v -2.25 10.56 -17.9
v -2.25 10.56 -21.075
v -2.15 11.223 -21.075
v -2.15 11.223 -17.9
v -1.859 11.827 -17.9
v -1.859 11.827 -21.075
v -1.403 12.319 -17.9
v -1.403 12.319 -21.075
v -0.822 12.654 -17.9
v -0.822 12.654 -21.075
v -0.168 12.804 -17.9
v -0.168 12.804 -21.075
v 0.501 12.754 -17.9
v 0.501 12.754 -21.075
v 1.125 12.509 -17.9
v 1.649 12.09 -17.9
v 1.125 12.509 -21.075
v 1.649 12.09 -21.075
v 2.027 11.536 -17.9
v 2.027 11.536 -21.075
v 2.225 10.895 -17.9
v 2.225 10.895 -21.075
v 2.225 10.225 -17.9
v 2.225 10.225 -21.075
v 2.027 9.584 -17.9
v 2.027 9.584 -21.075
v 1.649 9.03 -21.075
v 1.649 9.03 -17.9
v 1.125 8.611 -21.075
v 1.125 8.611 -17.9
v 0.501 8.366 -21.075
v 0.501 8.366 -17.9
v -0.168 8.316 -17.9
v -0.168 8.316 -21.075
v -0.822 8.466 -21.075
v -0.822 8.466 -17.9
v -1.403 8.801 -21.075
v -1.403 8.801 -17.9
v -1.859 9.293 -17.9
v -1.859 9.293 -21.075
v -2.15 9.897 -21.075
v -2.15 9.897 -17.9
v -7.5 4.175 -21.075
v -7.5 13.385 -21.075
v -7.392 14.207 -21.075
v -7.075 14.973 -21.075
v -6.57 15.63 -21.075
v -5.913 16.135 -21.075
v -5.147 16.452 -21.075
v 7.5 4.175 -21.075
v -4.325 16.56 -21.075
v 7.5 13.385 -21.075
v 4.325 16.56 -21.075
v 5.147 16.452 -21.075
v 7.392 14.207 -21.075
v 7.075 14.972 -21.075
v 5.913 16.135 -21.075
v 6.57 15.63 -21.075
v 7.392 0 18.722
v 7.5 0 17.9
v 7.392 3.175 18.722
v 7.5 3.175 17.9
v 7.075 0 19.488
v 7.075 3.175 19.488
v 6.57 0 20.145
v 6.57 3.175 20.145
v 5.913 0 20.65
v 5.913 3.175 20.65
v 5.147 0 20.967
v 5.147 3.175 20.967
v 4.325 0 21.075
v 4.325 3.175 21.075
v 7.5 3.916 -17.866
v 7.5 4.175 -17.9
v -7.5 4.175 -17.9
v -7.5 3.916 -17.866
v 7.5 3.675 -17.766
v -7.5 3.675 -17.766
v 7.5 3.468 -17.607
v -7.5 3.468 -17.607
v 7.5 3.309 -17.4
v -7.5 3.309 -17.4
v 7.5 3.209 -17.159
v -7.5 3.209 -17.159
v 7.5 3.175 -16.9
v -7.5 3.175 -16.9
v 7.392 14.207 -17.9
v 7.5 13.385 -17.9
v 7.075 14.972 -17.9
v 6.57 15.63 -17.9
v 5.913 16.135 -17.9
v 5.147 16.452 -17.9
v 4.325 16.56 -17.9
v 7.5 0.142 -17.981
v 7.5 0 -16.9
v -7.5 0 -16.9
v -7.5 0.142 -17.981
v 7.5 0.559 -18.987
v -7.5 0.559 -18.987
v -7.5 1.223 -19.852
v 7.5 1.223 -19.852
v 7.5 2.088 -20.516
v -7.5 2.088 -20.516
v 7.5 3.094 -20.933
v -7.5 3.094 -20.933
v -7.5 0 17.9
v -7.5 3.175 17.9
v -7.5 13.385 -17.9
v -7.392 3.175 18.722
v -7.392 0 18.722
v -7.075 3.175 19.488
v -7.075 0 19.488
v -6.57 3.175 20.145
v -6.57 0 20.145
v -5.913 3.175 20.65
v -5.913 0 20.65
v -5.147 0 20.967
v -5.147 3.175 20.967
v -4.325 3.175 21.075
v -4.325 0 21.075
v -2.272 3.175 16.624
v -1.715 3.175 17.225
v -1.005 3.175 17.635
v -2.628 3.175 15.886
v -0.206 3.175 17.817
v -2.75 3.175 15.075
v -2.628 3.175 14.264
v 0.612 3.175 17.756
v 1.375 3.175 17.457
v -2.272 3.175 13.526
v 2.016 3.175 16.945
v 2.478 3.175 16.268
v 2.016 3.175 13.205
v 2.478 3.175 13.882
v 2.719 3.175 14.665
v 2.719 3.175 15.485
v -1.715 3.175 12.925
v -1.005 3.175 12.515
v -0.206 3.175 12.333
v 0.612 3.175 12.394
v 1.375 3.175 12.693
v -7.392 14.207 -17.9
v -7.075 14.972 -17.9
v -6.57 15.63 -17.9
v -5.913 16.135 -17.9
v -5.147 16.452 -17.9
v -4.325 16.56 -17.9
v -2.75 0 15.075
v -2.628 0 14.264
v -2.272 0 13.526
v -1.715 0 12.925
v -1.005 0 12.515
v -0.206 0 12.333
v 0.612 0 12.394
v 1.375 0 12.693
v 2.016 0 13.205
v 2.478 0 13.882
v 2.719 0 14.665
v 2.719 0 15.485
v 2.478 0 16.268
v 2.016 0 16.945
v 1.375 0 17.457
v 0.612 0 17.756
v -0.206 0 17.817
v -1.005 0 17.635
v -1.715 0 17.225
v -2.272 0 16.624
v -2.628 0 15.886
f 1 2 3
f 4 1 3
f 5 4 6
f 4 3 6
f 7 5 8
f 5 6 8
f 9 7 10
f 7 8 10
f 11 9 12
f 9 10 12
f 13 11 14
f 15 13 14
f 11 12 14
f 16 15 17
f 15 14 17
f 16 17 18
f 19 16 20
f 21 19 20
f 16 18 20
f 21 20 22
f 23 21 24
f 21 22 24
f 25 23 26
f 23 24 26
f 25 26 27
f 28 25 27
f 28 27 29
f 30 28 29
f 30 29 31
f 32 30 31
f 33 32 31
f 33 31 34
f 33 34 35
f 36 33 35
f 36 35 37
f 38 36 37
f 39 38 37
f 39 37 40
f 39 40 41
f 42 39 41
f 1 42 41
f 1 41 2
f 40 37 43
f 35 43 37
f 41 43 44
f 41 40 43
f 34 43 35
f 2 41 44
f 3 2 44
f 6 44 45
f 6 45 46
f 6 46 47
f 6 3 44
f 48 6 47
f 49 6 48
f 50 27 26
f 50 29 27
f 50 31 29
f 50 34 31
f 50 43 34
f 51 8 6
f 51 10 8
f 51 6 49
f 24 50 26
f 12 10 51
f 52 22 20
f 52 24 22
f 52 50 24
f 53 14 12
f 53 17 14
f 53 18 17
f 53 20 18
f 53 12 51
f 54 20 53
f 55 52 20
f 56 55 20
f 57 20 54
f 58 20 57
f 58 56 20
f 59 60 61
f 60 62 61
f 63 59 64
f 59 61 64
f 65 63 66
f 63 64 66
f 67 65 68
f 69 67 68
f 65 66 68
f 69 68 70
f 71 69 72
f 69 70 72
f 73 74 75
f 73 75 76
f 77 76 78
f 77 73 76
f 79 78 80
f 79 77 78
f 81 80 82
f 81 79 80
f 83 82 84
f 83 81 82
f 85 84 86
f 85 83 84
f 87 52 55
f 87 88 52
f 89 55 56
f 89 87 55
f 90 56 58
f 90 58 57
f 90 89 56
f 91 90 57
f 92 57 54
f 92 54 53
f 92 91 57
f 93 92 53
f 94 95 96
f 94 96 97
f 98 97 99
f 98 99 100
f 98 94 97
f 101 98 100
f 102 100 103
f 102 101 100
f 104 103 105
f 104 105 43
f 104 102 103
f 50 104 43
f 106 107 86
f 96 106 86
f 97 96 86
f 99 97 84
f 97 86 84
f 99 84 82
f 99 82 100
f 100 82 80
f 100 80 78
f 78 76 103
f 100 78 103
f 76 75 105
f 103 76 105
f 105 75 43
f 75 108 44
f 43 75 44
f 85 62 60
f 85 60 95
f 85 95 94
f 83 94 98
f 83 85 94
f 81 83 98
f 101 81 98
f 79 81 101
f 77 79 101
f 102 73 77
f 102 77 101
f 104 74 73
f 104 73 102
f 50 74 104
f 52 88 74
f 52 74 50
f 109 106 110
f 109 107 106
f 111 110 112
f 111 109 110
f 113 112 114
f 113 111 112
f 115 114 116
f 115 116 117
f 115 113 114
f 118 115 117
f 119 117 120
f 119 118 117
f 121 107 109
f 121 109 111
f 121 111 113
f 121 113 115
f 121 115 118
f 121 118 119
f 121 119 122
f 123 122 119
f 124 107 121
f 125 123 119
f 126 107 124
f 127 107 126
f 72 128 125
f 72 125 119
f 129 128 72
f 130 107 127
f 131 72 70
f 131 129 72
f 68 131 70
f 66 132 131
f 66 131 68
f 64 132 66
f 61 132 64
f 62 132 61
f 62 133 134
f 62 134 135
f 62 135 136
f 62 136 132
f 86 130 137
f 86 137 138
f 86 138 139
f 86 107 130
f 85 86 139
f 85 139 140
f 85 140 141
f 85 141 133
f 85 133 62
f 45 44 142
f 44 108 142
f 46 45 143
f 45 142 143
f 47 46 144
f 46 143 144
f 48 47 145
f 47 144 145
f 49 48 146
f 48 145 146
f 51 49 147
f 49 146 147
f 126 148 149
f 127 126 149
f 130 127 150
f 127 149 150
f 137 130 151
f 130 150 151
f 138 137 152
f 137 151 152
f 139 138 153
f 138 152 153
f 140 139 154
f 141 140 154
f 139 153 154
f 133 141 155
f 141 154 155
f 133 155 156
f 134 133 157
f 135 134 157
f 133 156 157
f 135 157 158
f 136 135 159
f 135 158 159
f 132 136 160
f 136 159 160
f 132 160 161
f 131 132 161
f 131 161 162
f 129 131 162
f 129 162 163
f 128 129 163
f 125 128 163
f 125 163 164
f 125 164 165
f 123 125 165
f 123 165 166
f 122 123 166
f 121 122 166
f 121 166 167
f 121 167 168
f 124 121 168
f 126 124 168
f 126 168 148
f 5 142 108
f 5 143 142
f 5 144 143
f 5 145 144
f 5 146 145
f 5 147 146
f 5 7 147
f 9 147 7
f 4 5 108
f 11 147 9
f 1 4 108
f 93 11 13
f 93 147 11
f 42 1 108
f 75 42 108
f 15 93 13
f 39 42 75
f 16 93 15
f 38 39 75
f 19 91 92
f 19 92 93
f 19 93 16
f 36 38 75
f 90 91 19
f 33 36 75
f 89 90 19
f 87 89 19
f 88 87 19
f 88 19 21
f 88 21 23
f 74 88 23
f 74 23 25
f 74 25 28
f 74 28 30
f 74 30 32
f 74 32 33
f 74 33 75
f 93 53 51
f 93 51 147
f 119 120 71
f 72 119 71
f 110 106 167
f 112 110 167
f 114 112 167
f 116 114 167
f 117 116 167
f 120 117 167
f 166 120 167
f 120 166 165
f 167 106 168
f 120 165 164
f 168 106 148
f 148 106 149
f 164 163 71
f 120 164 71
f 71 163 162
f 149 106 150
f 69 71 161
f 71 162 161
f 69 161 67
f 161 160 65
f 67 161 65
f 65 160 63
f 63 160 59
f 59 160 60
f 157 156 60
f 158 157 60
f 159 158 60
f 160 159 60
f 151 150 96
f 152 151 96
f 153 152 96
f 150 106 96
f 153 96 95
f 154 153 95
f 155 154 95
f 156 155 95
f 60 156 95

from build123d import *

# Parameters (mm, degrees)
SKETCH1_W                    = 15
SKETCH1_H                    = 42.15
BASE_FLANGE1_DEPTH           = 3.175
EDGE_FLANGE1_STRIP_W         = 14.7
EDGE_FLANGE1_STRIP_H         = 3.175
EDGE_FLANGE1_STRIP_CUT_DEPTH = 15
EDGE_FLANGE1_DEPTH           = 15
M5_CLEARANCE_HOLE1_D         = 5.5
M4_CLEARANCE_HOLE1_D         = 4.5
FILLET1_R                    = 3.175


# Sheet-metal steps are written as plain solids
with BuildPart() as part:
    # Sketch1 → Base-Flange1 (new body)
    with BuildSketch(Plane(origin=(0, 0, 0), x_dir=(1, 0, 0), z_dir=(0, 1, 0))):
        Rectangle(SKETCH1_W, SKETCH1_H)
    extrude(amount=BASE_FLANGE1_DEPTH)

    # Edge-Flange1 strip (across the edge) → Edge-Flange1 strip cut (cut)
    with BuildSketch(Plane(origin=(7.5, 3.175, -21.075), x_dir=(0, 0, 1), z_dir=(-1, 0, 0))):
        with Locations((-3.175, -1.5875)):
            Rectangle(EDGE_FLANGE1_STRIP_W, EDGE_FLANGE1_STRIP_H)
    extrude(amount=EDGE_FLANGE1_STRIP_CUT_DEPTH, mode=Mode.SUBTRACT)

    # Edge-Flange1 section (across the edge) → Edge-Flange1 (add)
    with BuildSketch(Plane(origin=(7.5, 3.175, -21.075), x_dir=(0, 0, 1), z_dir=(-1, 0, 0))):
        with BuildLine():
            Line((0, 1), (0, 13.385))
            Line((0, 13.385), (3.175, 13.385))
            Line((3.175, 13.385), (3.175, 1))
            ThreePointArc((3.175, 1), (3.467893219, 0.292893219), (4.175, 0))
            Line((4.175, 0), (4.175, -3.175))
            ThreePointArc((4.175, -3.175), (1.222829189, -1.952170811), (0, 1))
        make_face()
    extrude(amount=EDGE_FLANGE1_DEPTH)

    # M5 Clearance Hole1 (through all)
    with Locations(Plane(origin=(0, 3.175, 0), x_dir=(1, 0, 0), z_dir=(0, 1, 0))):
        with Locations((0, -15.075)):
            Hole(M5_CLEARANCE_HOLE1_D / 2)

    # M4 Clearance Hole1 (through all)
    with Locations(Plane.XY.offset(-17.9)):
        with Locations((0, 10.56)):
            Hole(M4_CLEARANCE_HOLE1_D / 2)

    # Fillet1
    fillet1_edges = [part.edges().sort_by_distance(p)[0] for p in [
        (7.5, 16.56, -19.4875),
        (-7.5, 16.56, -19.4875),
        (7.5, 1.5875, 21.075),
        (-7.5, 1.5875, 21.075),
    ]]
    fillet(fillet1_edges, radius=FILLET1_R)


solid = part.part
